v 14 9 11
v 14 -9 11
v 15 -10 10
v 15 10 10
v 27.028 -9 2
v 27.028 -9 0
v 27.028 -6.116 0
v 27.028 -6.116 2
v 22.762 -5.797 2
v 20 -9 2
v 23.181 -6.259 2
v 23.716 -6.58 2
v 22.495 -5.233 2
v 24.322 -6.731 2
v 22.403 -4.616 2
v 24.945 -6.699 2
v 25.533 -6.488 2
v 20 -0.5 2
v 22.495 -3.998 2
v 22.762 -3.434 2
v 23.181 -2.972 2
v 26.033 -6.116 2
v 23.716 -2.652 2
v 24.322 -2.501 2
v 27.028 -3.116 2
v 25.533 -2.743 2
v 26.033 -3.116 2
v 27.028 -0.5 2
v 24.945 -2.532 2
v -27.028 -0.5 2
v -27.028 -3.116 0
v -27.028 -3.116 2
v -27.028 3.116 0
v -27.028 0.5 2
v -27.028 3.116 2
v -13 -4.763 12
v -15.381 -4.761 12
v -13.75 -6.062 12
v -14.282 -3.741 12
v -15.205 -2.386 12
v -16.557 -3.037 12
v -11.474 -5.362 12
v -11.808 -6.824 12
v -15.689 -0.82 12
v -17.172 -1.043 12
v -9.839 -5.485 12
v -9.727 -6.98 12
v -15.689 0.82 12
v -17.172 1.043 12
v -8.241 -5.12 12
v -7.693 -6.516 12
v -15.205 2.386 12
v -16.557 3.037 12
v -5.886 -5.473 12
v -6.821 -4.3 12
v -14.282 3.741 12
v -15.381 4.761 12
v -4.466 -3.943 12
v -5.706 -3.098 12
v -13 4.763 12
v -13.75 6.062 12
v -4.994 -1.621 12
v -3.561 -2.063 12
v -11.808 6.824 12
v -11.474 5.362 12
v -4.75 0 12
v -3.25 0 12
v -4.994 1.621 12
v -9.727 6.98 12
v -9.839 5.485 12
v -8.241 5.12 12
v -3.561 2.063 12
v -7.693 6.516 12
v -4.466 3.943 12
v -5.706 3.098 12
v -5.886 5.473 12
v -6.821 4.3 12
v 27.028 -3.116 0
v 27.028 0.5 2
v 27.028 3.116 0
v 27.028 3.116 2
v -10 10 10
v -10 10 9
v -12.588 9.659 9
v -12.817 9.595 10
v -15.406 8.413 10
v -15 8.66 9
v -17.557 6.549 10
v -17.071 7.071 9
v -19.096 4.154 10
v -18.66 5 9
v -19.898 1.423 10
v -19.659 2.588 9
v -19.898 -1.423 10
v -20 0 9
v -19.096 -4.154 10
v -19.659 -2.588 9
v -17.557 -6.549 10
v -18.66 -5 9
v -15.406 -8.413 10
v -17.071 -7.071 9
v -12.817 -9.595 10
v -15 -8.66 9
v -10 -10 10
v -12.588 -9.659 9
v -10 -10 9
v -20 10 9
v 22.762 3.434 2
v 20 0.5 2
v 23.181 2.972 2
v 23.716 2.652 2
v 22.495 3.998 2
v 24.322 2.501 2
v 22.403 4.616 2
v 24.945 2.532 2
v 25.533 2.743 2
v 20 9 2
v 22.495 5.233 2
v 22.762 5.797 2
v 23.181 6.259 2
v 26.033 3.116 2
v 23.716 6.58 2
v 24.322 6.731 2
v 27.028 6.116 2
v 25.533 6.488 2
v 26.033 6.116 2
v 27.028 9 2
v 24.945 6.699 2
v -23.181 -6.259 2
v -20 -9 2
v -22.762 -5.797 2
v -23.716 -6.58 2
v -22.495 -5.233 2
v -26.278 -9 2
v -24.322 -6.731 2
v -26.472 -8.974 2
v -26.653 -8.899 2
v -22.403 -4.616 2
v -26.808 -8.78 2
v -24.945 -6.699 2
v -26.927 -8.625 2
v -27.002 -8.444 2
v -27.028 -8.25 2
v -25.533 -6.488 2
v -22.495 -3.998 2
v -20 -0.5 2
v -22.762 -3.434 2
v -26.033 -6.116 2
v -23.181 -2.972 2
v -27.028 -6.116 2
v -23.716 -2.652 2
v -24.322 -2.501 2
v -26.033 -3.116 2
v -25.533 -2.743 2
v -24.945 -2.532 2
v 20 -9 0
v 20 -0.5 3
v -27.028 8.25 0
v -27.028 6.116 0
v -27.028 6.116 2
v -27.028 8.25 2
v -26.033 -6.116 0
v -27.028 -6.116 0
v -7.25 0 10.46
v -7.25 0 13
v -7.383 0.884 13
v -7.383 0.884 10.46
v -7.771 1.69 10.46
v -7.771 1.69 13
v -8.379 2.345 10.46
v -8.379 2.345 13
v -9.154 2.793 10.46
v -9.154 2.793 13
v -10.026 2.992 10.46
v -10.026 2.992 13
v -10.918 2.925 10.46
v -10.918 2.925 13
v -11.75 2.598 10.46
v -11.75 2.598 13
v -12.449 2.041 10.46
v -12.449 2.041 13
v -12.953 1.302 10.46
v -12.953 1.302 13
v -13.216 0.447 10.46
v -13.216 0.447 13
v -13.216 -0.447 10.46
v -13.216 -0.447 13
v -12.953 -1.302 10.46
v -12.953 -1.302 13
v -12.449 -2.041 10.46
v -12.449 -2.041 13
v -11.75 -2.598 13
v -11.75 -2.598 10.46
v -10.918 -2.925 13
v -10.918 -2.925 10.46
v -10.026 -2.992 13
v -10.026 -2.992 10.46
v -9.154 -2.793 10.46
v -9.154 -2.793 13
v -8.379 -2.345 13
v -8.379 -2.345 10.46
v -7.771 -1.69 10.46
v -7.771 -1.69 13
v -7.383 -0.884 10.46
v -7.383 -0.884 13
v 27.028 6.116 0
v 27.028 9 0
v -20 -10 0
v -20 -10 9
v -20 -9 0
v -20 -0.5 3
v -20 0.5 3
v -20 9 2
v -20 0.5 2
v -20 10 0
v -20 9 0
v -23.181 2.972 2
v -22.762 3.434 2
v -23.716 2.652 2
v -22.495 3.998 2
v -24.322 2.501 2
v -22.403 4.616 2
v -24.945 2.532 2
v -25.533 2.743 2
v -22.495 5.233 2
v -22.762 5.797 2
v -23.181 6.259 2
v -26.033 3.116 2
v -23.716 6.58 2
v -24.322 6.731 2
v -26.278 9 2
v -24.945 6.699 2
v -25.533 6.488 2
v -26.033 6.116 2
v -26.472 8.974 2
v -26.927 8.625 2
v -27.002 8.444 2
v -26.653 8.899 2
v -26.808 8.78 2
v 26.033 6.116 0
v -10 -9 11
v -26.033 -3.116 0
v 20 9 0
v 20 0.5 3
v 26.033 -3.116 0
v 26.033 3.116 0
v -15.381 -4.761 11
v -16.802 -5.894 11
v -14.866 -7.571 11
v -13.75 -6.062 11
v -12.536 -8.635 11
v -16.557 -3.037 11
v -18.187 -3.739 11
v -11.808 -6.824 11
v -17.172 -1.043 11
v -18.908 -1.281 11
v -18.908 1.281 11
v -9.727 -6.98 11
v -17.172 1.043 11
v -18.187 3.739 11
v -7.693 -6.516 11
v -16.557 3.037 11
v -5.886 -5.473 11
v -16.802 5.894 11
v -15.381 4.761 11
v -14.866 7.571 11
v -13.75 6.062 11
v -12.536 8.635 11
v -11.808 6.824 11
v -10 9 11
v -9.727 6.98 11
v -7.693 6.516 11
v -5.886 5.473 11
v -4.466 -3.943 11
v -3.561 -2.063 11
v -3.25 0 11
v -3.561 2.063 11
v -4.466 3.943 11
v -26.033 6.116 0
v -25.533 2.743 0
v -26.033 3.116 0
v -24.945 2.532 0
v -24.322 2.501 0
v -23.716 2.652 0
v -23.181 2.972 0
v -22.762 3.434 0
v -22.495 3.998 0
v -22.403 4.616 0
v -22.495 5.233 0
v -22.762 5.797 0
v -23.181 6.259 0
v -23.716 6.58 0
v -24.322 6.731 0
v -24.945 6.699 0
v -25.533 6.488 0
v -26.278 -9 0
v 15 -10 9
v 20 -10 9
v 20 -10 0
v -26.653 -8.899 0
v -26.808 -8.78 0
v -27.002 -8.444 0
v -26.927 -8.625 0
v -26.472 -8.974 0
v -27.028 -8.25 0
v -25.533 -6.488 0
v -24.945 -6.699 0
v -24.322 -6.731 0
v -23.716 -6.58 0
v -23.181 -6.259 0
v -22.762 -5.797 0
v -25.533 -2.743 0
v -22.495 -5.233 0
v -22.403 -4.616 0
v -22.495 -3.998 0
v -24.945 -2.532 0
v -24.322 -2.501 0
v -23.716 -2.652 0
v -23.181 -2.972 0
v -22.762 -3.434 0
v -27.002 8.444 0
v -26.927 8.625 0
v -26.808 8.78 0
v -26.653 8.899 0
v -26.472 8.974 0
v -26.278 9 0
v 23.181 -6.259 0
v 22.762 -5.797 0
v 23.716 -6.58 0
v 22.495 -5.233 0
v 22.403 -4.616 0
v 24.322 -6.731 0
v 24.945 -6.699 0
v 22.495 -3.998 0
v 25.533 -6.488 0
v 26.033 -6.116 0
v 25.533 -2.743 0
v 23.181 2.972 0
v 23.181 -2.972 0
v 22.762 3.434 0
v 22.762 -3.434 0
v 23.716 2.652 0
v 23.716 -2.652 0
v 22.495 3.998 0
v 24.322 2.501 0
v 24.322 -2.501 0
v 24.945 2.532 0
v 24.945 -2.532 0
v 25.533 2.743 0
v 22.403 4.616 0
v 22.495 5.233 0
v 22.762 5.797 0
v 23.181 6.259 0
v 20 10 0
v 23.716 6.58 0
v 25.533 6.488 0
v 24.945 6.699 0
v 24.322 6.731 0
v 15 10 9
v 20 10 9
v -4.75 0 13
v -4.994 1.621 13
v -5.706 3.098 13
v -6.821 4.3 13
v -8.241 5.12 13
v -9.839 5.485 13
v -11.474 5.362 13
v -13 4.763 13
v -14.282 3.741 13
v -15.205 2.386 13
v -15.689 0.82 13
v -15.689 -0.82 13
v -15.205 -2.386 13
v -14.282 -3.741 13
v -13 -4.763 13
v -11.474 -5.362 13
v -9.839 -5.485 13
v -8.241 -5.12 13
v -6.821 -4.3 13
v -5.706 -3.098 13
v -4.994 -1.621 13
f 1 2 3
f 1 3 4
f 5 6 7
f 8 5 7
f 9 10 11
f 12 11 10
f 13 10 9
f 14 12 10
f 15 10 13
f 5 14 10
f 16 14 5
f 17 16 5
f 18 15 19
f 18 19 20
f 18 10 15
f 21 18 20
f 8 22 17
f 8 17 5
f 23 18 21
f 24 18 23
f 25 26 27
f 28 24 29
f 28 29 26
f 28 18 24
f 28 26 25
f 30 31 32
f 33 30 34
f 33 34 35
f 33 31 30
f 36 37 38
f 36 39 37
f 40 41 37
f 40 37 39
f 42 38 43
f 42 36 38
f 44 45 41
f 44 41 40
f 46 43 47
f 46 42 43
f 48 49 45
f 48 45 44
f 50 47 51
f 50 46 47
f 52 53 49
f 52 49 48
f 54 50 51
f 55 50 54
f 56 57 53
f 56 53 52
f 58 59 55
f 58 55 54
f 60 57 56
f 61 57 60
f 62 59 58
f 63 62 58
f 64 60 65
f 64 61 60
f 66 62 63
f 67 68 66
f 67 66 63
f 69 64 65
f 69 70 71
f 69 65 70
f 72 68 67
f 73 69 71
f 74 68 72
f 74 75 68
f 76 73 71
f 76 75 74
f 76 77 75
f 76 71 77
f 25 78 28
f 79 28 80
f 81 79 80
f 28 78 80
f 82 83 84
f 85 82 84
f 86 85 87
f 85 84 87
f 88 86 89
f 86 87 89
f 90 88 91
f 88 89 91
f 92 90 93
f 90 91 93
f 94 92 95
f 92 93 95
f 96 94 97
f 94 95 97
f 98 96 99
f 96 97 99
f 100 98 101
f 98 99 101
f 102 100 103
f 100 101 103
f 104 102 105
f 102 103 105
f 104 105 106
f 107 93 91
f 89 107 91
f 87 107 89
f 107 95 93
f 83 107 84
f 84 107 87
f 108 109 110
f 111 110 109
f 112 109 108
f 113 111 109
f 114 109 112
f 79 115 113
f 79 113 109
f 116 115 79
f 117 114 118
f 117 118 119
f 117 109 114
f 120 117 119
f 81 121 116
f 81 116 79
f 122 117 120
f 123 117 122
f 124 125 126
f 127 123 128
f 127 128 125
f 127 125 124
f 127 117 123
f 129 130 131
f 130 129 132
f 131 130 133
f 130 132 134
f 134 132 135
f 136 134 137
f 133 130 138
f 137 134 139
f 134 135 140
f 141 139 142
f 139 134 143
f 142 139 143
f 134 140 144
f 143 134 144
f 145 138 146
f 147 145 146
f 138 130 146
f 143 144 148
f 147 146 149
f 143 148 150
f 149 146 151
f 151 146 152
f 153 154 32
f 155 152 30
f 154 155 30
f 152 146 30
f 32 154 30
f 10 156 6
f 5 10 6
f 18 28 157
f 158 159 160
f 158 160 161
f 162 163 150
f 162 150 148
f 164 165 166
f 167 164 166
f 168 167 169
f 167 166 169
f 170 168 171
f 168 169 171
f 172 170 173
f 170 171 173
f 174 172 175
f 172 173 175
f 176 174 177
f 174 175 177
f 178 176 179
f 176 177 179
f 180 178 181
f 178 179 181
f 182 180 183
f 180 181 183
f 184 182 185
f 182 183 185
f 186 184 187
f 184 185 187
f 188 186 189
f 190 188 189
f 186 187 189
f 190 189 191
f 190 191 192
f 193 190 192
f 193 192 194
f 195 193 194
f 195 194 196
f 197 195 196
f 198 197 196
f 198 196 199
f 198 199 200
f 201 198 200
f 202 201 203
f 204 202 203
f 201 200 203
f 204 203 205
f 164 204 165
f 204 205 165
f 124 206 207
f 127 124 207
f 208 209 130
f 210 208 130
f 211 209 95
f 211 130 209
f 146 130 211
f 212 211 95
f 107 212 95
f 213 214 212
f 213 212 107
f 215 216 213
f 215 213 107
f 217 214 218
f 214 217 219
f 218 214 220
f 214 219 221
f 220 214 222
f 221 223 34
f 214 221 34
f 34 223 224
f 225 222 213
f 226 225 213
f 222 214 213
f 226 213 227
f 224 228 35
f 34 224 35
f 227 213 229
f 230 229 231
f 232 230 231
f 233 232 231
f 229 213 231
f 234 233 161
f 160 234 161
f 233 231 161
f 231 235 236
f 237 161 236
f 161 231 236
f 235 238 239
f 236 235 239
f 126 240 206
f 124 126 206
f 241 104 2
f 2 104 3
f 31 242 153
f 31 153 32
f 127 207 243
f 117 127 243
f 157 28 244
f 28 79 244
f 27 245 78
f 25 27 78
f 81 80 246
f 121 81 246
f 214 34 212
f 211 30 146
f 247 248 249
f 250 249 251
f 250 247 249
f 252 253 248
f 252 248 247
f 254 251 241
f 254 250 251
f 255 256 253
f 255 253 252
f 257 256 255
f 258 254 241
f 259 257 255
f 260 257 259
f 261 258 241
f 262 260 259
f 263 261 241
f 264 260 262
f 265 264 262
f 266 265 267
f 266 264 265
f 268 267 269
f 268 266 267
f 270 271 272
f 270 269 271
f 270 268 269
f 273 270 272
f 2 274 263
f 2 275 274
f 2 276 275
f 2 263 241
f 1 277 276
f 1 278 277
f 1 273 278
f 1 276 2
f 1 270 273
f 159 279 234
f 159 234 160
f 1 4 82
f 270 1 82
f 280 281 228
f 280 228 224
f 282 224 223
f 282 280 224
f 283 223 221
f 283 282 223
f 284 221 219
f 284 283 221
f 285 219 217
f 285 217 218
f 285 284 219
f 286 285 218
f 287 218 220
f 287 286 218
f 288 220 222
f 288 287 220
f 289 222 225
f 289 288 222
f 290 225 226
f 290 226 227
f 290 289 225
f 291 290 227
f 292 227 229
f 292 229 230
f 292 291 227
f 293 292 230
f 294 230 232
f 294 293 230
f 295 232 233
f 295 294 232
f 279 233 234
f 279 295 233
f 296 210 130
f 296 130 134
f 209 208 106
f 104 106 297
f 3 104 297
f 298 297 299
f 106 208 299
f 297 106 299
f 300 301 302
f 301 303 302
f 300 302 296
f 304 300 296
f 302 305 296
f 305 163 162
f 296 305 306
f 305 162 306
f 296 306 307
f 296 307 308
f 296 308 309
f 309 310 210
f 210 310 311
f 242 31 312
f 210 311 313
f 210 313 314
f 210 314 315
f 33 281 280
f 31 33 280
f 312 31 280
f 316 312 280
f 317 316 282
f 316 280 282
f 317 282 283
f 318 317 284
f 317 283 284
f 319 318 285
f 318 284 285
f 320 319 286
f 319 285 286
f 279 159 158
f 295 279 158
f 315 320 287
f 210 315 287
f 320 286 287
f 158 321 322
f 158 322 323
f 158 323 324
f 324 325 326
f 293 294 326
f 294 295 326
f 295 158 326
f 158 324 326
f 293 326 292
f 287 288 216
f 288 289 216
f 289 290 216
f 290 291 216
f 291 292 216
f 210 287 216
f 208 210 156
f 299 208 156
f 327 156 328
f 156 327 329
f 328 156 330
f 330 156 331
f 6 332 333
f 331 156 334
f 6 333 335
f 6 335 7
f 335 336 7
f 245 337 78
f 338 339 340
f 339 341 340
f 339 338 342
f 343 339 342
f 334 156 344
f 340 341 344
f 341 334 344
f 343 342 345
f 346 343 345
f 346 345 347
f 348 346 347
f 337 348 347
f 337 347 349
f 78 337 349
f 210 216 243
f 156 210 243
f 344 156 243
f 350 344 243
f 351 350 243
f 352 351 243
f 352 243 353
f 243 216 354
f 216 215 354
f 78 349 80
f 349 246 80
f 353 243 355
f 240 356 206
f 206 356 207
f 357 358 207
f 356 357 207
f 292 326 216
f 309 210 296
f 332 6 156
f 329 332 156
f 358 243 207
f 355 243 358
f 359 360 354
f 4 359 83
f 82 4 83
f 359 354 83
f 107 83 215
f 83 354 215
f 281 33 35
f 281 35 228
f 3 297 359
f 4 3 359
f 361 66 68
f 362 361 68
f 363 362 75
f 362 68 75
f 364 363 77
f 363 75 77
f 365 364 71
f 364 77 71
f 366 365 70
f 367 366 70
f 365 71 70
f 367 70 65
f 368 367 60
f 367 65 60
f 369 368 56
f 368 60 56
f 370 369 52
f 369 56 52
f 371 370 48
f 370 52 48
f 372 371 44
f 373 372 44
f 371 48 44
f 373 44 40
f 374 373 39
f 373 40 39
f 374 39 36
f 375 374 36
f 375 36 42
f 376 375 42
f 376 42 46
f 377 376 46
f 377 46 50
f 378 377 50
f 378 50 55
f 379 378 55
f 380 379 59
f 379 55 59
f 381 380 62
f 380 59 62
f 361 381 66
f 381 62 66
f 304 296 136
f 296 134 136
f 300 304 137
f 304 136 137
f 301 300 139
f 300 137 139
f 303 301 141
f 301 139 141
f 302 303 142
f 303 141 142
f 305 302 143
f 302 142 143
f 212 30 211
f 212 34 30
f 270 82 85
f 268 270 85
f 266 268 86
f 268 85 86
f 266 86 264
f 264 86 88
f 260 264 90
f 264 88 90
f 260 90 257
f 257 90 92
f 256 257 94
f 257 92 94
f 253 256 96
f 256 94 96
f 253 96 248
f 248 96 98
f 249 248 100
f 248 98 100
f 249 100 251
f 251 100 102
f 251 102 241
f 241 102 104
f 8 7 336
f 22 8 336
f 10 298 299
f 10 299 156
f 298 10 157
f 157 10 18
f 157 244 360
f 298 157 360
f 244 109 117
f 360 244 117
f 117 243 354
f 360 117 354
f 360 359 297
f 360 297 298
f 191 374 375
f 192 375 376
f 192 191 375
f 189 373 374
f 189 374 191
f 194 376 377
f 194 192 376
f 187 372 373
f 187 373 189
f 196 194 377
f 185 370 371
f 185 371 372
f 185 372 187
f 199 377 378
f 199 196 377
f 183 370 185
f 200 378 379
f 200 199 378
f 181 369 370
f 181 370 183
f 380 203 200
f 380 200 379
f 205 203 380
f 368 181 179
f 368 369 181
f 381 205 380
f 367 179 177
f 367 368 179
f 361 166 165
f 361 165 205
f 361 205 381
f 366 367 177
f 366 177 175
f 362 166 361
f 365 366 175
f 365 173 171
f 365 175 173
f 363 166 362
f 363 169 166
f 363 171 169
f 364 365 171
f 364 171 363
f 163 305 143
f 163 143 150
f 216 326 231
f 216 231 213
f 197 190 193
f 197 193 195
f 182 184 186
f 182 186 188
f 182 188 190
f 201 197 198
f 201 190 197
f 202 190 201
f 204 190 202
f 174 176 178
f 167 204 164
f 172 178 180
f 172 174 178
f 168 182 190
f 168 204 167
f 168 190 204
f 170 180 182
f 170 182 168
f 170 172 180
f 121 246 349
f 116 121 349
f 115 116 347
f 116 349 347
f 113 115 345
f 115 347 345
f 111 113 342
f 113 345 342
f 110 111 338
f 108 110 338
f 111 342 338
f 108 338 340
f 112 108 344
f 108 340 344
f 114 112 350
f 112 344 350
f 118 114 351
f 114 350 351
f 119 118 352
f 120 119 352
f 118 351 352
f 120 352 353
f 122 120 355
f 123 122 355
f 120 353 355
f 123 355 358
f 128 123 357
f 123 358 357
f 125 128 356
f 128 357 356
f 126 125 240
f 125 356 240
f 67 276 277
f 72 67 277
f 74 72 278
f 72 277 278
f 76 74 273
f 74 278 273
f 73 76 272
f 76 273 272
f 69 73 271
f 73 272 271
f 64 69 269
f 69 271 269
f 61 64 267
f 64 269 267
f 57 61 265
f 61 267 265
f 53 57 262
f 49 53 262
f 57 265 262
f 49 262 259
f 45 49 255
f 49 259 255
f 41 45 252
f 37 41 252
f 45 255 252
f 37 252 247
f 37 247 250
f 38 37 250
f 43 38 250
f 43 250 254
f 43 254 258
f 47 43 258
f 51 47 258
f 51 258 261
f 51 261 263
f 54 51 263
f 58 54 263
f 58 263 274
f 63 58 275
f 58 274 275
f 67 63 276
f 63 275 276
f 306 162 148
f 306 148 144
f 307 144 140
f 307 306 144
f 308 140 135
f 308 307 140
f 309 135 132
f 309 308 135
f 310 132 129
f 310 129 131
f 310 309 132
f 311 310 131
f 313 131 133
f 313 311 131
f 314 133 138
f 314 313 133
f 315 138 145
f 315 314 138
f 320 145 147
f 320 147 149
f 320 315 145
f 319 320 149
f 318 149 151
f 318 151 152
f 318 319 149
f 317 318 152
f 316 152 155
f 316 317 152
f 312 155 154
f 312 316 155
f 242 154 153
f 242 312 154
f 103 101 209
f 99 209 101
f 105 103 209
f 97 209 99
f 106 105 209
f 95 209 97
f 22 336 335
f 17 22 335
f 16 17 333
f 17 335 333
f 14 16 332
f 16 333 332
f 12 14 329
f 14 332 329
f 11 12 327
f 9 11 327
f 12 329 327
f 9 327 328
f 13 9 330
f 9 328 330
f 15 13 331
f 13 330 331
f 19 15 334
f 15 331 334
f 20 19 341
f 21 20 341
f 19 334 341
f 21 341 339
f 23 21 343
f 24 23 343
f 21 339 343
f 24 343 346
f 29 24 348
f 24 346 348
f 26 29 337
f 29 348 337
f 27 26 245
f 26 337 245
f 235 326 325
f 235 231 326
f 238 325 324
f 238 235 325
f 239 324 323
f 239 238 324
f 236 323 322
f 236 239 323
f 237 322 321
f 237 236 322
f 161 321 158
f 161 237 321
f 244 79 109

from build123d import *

# Parameters (mm, degrees)
SKETCH1_W           = 39.99992
SKETCH1_H           = 19.99996
BOSS_EXTRUDE1_DEPTH = 9.0000074
BOSS_EXTRUDE2_DEPTH = 2.00000108
CHAMFER2_SIZE       = 1.00000054
SKETCH3_R           = 6.9999987
BOSS_EXTRUDE3_DEPTH = 1.00000054
SKETCH4_R           = 5.5000017
BOSS_EXTRUDE4_DEPTH = 1.00000054
SKETCH5_R           = 2.999994
CUT_EXTRUDE1_DEPTH  = 2.54
BOSS_EXTRUDE5_DEPTH = 1.999996
FILLET1_R           = 0.7500112
BOSS_EXTRUDE6_DEPTH = 0.50000027


with BuildPart() as part:
    # Sketch1 → Boss-Extrude1 (new body)
    with BuildSketch(Plane.XY):
        Rectangle(SKETCH1_W, SKETCH1_H)
    extrude(amount=BOSS_EXTRUDE1_DEPTH)

    # Sketch2 → Boss-Extrude2 (add)
    with BuildSketch(Plane.XY.offset(9.0000074)):
        with BuildLine():
            Line((14.99997, 9.99998), (-9.99998, 9.99998))
            ThreePointArc((-9.99998, 9.99998), (-19.99996, 0), (-9.99998, -9.99998))
            Line((-9.99998, -9.99998), (14.99997, -9.99998))
            Line((14.99997, -9.99998), (14.99997, 9.99998))
        make_face()
    extrude(amount=BOSS_EXTRUDE2_DEPTH)

    # Chamfer2
    chamfer2_edges = [part.edges().sort_by_distance(p)[0] for p in [
        (2.499995, -9.99998, 11.00000848),
        (-19.99996, 0, 11.00000848),
        (2.499995, 9.99998, 11.00000848),
        (14.99997, 0, 11.00000848),
    ]]
    chamfer(chamfer2_edges, length=CHAMFER2_SIZE)

    # Sketch3 → Boss-Extrude3 (add)
    with BuildSketch(Plane.XY.offset(11.00000848)):
        with Locations((-10.24995918, 0)):
            Circle(SKETCH3_R)
    extrude(amount=BOSS_EXTRUDE3_DEPTH)

    # Sketch4 → Boss-Extrude4 (add)
    with BuildSketch(Plane.XY.offset(12.00000902)):
        with Locations((-10.24995918, 0)):
            Circle(SKETCH4_R)
    extrude(amount=BOSS_EXTRUDE4_DEPTH)

    # Sketch5 → Cut-Extrude1 (cut)
    with BuildSketch(Plane.XY.offset(13.00000956)):
        with Locations((-10.24995918, 0)):
            Circle(SKETCH5_R)
    extrude(amount=-CUT_EXTRUDE1_DEPTH, mode=Mode.SUBTRACT)

    # Sketch6 → Boss-Extrude5 (add)
    with BuildSketch(Plane(origin=(0, 0, 0), x_dir=(-1, 0, 0), z_dir=(0, 0, -1))):
        with BuildLine():
            Line((27.027886, 8.99997946), (19.99996, 8.99997946))
            Line((19.99996, 8.99997946), (19.99996, -8.99997946))
            Line((19.99996, -8.99997946), (27.027886, -8.99997946))
            Line((27.027886, -8.99997946), (27.027886, -6.115627342))
            Line((27.027886, -6.115627342), (26.033157804, -6.115627342))
            ThreePointArc((26.033157804, -6.115627342), (22.40296035, -4.615626532), (26.033157804, -3.115625722))
            Line((26.033157804, -3.115625722), (27.027886, -3.115625722))
            Line((27.027886, -3.115625722), (27.027886, 3.115623182))
            Line((27.027886, 3.115623182), (26.033157804, 3.115623182))
            ThreePointArc((26.033157804, 3.115623182), (22.40296035, 4.615623992), (26.033157804, 6.115624802))
            Line((26.033157804, 6.115624802), (27.027886, 6.115624802))
            Line((27.027886, 6.115624802), (27.027886, 8.99997946))
        make_face()
    boss_extrude5 = extrude(amount=-BOSS_EXTRUDE5_DEPTH)

    # Fillet1
    fillet1_edges = [part.edges().sort_by_distance(p)[0] for p in [
        (-27.027886, -8.99997946, 0.999998),
        (-27.027886, 8.99997946, 0.999998),
    ]]
    fillet(fillet1_edges, radius=FILLET1_R)

    # Sketch7 → Boss-Extrude6 (add, symmetric)
    with BuildSketch(Plane(origin=(0, 0, 0), x_dir=(1, 0, 0), z_dir=(0, 1, 0))):
        Polygon((-27.027886, -1.999996), (-19.99996, -2.99999654), (-19.99996, -1.999996), align=None)
    boss_extrude6 = extrude(amount=BOSS_EXTRUDE6_DEPTH, both=True)

    # Mirror1: Boss-Extrude5, Boss-Extrude6 across plane
    add(boss_extrude5.mirror(Plane(origin=(0, 0, 0), x_dir=(0, 0, 1), z_dir=(1, 0, 0))))
    add(boss_extrude6.mirror(Plane(origin=(0, 0, 0), x_dir=(0, 0, 1), z_dir=(1, 0, 0))))


solid = part.part
